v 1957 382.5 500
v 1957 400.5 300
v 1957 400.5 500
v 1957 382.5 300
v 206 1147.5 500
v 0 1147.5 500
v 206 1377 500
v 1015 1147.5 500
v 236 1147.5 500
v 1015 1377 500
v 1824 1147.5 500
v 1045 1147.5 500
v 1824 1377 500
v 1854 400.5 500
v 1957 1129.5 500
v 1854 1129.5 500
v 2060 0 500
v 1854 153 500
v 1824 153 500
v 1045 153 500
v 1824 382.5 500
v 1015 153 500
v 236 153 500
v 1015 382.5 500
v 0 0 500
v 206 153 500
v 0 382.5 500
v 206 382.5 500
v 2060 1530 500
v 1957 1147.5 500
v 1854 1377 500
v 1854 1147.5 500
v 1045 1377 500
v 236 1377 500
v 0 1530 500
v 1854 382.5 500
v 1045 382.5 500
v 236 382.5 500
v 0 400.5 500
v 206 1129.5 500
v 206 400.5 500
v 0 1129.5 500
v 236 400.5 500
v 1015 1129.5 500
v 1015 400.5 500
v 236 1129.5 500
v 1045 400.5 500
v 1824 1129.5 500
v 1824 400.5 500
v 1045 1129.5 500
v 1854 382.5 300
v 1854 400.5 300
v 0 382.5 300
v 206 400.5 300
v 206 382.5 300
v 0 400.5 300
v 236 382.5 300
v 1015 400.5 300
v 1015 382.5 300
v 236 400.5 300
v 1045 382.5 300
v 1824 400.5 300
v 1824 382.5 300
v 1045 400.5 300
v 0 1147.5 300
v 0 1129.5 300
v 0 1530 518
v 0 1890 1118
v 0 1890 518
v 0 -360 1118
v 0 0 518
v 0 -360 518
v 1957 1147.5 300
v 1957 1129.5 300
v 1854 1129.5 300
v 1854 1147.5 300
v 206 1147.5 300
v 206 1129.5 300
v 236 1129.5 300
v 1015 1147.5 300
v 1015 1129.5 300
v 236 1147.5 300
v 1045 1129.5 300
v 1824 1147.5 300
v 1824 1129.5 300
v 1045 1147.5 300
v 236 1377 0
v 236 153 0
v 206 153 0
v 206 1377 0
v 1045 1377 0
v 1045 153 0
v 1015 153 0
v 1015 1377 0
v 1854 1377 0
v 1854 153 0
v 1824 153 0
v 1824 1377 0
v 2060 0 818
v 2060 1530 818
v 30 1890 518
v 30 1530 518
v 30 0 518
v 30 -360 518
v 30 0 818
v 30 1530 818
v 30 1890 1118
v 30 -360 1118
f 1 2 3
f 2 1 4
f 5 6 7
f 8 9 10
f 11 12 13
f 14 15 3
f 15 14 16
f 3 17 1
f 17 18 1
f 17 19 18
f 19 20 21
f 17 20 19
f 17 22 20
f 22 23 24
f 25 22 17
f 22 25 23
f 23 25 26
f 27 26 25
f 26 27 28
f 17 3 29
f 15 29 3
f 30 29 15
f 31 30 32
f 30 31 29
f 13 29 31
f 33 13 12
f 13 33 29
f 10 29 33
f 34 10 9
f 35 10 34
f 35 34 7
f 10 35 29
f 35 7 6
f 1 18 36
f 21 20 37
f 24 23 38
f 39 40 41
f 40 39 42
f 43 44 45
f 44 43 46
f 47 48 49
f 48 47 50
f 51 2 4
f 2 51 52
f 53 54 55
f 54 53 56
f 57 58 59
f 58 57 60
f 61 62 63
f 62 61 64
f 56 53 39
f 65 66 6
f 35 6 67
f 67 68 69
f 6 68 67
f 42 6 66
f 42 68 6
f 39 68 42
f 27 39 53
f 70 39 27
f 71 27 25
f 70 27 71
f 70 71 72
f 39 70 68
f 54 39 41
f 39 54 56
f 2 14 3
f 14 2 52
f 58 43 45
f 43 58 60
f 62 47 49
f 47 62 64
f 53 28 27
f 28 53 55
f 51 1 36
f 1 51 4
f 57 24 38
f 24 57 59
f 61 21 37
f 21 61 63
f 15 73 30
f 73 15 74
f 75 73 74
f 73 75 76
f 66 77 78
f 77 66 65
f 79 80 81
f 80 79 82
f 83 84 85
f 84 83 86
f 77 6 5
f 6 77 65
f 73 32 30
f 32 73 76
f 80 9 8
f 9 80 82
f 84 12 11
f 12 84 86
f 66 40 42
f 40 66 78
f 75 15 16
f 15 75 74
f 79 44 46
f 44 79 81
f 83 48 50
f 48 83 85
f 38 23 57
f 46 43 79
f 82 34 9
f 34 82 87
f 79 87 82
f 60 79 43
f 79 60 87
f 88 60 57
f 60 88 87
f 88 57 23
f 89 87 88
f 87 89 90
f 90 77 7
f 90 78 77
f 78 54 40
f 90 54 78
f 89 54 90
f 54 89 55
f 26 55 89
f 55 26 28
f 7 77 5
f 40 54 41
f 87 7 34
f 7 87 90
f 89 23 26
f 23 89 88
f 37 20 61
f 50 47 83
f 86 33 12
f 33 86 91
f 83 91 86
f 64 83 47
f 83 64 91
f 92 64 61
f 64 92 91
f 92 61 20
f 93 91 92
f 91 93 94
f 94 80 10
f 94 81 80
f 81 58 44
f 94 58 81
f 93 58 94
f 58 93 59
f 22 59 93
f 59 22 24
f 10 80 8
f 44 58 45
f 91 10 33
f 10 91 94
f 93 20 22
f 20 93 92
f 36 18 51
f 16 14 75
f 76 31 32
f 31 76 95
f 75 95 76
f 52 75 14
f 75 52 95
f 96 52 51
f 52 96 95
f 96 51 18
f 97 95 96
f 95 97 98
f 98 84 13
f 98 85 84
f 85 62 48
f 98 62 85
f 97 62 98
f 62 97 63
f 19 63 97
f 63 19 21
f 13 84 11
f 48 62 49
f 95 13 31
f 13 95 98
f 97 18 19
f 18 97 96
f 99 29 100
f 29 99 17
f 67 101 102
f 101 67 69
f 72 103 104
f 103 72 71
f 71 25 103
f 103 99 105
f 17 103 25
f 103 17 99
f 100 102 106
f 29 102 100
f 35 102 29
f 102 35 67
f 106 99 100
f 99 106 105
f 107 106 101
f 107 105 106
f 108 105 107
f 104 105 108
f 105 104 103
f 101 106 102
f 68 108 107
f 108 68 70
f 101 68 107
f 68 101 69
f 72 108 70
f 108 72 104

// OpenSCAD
bed_width = 1530;
bed_height = 500;
n_slats = 8;
slat_width = 150;

long_support_thickness = 18;
long_support_height = 200;
wide_support_thickness = 30;
slat_thickness = 18;

mattress_height = 300;
mattress_length = 2030;

head_height = 600;  // mattress_height + 300;
head_width = 2250;  // bed_width + 800;
head_thickness = 30;

bed_length = mattress_length + head_thickness;

side_table_width = (head_width - bed_width) / 2;

module long_support() {
  f = 0.05;
  d = bed_length * f;
  x = bed_length - d;
  y = long_support_thickness;
  z = long_support_height;
  color([0, 0.5, 0.5]) {
    translate([0, 0, bed_height - long_support_height]) cube([x, y, z]);
  }
  echo("Long support: ", x, y, z);
}

module all_long_supports() {
  d = bed_width / 4;
  o1 = d;
  o2 = bed_width - d - long_support_thickness;
  translate([0, o1]) long_support();
  translate([0, o2]) long_support();
}

module wide_support() {
  f = 0.1;
  d = bed_width * f;
  w = bed_width - 2 * d;
  x = wide_support_thickness;
  y = w;
  z = bed_height;
  translate([0, d, 0]) cube([x, y, z]);
  echo("Wide support: ", x, y, z);
}

module all_wide_supports() {
  f = 0.1;
  d = bed_length * f;
  translate([d, 0, 0]) wide_support();
  translate([d + (bed_length - wide_support_thickness - 2 * d) / 2, 0, 0]) wide_support();
  translate([d + 2 * (bed_length - wide_support_thickness - 2 * d) / 2, 0, 0]) wide_support();
}

module slat() {
  x = bed_length;
  y = bed_width / 2;
  z = slat_thickness;
  color([0.5, 0.5, 0]) {
    translate([0, 0, bed_height]) cube([x, y, z]);
  }
  echo("Slat: ", x, y, z);
}

module mattress() {
  translate([head_thickness, 0, bed_height + 18]) color([0, 0, 1]) cube([mattress_length, bed_width, mattress_height]);
}

module head() {
  x = head_thickness;
  y = head_width;
  z = head_height;
  translate([0, -(head_width - bed_width) / 2, bed_height + 18]) cube([x, y, z]);
  echo("Head: ", x, y, z);
}

module head_support() {
  translate([-50, 0, 0]) cube([50, 30, bed_height + 18 + head_height / 2]);
}

module side_table() {
  translate([0, -side_table_width, bed_height]) cube([side_table_width, side_table_width, 18]);
}

module side_support() {
  translate([70, 0, bed_height - 30]) cube([30, 500, 30]);
}

all_long_supports();

all_wide_supports();

slat();
translate([0, bed_width / 2, 0]) slat();

mattress();

head();

/* translate([0, 200, 0]) head_support(); */
/* translate([0, bed_width - 30 - 200, 0]) head_support(); */

/* side_table(); */
/* translate([0, bed_width + side_table_width, 0]) side_table(); */

/* translate([0, -200, 0]) side_support(); */
/* translate([170, -200, 0]) side_support(); */
/* translate([0, bed_width - 500 + 200, 0]) side_support(); */
/* translate([170, bed_width - 500 + 200, 0]) side_support(); */
